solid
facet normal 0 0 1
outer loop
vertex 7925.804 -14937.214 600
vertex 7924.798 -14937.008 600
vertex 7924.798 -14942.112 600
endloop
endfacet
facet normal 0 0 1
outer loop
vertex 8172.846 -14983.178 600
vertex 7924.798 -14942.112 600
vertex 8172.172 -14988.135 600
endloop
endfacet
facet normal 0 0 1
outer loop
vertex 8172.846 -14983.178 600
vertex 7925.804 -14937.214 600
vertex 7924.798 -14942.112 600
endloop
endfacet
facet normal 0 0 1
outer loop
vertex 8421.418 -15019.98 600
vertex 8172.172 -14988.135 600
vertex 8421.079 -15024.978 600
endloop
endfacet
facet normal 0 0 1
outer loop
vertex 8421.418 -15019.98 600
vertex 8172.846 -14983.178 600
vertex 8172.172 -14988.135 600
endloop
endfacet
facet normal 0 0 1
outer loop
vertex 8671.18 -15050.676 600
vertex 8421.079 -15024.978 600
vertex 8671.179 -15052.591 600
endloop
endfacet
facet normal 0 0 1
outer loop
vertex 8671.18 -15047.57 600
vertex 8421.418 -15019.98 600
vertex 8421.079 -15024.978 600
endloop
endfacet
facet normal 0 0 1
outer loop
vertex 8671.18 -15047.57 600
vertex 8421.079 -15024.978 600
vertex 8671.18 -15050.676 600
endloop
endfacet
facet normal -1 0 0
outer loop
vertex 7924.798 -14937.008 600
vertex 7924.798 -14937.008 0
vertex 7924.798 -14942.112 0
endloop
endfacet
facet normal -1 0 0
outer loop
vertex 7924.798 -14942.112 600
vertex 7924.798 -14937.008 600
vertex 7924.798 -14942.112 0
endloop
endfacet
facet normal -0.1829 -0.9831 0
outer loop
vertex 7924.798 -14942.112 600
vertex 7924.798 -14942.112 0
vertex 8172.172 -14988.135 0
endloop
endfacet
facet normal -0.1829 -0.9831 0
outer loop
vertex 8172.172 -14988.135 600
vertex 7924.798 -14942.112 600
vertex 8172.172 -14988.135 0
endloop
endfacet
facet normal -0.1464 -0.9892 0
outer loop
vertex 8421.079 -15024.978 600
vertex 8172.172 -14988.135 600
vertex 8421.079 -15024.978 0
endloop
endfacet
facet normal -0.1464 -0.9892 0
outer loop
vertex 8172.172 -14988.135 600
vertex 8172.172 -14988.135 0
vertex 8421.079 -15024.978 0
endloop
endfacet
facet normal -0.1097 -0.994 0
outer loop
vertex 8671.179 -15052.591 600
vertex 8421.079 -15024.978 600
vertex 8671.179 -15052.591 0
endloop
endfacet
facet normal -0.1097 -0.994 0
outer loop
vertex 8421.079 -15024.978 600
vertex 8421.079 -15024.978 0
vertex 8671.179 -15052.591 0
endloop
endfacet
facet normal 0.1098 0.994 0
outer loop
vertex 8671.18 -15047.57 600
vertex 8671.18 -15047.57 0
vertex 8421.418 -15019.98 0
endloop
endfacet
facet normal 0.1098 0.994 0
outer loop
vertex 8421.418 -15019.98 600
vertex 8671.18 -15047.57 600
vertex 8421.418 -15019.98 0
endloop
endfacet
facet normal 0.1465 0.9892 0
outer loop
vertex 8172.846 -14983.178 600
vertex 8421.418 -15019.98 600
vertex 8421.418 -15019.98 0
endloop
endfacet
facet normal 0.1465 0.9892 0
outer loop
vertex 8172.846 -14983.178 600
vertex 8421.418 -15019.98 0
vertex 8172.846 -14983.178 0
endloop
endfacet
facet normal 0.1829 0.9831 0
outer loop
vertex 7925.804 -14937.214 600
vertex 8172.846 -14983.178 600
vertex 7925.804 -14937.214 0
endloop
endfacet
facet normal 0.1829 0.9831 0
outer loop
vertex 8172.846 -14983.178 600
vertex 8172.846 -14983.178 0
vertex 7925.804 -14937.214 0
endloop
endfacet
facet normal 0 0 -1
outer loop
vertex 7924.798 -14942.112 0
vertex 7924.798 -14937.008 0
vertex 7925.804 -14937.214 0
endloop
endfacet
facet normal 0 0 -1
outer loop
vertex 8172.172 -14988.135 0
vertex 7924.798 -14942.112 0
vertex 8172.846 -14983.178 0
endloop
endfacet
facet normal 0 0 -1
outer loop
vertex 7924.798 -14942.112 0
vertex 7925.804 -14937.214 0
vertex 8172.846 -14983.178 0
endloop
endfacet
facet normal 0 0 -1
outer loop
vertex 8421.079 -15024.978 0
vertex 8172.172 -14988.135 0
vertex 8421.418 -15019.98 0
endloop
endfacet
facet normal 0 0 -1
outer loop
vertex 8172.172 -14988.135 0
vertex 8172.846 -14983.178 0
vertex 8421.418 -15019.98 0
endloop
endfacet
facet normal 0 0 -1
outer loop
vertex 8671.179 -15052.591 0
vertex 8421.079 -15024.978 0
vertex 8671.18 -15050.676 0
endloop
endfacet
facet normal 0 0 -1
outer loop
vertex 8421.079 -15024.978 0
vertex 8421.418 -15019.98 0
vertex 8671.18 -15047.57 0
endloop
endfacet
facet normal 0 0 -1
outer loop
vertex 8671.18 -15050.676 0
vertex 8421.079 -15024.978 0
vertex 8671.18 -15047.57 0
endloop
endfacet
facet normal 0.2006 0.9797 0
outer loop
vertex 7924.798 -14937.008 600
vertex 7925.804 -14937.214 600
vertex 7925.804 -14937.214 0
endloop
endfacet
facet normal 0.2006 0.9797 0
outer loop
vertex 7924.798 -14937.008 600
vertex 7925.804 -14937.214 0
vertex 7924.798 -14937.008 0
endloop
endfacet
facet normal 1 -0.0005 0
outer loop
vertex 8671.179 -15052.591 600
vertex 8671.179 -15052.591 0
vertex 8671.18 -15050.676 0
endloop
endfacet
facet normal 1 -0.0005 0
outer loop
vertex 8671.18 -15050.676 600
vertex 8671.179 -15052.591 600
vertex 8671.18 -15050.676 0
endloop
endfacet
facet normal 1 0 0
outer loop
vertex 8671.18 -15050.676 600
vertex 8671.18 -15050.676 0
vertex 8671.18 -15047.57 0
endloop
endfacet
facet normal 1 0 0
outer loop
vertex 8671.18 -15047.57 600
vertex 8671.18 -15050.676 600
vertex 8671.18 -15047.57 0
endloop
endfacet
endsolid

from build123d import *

# Parameters (mm, degrees)
BOSS_EXTRUDE1_DEPTH = 600


with BuildPart() as part:
    # Sketch2 → Boss-Extrude1 (new body)
    with BuildSketch(Plane.XY):
        with BuildLine():
            Line((8671.180248107, -15050.67644099), (8671.180248107, -15047.570291511))
            ThreePointArc((8671.180248107, -15047.570291511), (8296.961694468, -15002.727582577), (7925.803525446, -14937.214164091))
            Line((7925.803525446, -14937.214164091), (7924.798244697, -14937.007753794))
            Line((7924.798244697, -14937.007753794), (7924.798244697, -14942.112062683))
            ThreePointArc((7924.798244697, -14942.112062683), (8296.455606532, -15007.707153296), (8671.178621007, -15052.591147568))
            Line((8671.178621007, -15052.591147568), (8671.180248107, -15050.67644099))
        make_face()
    extrude(amount=BOSS_EXTRUDE1_DEPTH)


solid = part.part
